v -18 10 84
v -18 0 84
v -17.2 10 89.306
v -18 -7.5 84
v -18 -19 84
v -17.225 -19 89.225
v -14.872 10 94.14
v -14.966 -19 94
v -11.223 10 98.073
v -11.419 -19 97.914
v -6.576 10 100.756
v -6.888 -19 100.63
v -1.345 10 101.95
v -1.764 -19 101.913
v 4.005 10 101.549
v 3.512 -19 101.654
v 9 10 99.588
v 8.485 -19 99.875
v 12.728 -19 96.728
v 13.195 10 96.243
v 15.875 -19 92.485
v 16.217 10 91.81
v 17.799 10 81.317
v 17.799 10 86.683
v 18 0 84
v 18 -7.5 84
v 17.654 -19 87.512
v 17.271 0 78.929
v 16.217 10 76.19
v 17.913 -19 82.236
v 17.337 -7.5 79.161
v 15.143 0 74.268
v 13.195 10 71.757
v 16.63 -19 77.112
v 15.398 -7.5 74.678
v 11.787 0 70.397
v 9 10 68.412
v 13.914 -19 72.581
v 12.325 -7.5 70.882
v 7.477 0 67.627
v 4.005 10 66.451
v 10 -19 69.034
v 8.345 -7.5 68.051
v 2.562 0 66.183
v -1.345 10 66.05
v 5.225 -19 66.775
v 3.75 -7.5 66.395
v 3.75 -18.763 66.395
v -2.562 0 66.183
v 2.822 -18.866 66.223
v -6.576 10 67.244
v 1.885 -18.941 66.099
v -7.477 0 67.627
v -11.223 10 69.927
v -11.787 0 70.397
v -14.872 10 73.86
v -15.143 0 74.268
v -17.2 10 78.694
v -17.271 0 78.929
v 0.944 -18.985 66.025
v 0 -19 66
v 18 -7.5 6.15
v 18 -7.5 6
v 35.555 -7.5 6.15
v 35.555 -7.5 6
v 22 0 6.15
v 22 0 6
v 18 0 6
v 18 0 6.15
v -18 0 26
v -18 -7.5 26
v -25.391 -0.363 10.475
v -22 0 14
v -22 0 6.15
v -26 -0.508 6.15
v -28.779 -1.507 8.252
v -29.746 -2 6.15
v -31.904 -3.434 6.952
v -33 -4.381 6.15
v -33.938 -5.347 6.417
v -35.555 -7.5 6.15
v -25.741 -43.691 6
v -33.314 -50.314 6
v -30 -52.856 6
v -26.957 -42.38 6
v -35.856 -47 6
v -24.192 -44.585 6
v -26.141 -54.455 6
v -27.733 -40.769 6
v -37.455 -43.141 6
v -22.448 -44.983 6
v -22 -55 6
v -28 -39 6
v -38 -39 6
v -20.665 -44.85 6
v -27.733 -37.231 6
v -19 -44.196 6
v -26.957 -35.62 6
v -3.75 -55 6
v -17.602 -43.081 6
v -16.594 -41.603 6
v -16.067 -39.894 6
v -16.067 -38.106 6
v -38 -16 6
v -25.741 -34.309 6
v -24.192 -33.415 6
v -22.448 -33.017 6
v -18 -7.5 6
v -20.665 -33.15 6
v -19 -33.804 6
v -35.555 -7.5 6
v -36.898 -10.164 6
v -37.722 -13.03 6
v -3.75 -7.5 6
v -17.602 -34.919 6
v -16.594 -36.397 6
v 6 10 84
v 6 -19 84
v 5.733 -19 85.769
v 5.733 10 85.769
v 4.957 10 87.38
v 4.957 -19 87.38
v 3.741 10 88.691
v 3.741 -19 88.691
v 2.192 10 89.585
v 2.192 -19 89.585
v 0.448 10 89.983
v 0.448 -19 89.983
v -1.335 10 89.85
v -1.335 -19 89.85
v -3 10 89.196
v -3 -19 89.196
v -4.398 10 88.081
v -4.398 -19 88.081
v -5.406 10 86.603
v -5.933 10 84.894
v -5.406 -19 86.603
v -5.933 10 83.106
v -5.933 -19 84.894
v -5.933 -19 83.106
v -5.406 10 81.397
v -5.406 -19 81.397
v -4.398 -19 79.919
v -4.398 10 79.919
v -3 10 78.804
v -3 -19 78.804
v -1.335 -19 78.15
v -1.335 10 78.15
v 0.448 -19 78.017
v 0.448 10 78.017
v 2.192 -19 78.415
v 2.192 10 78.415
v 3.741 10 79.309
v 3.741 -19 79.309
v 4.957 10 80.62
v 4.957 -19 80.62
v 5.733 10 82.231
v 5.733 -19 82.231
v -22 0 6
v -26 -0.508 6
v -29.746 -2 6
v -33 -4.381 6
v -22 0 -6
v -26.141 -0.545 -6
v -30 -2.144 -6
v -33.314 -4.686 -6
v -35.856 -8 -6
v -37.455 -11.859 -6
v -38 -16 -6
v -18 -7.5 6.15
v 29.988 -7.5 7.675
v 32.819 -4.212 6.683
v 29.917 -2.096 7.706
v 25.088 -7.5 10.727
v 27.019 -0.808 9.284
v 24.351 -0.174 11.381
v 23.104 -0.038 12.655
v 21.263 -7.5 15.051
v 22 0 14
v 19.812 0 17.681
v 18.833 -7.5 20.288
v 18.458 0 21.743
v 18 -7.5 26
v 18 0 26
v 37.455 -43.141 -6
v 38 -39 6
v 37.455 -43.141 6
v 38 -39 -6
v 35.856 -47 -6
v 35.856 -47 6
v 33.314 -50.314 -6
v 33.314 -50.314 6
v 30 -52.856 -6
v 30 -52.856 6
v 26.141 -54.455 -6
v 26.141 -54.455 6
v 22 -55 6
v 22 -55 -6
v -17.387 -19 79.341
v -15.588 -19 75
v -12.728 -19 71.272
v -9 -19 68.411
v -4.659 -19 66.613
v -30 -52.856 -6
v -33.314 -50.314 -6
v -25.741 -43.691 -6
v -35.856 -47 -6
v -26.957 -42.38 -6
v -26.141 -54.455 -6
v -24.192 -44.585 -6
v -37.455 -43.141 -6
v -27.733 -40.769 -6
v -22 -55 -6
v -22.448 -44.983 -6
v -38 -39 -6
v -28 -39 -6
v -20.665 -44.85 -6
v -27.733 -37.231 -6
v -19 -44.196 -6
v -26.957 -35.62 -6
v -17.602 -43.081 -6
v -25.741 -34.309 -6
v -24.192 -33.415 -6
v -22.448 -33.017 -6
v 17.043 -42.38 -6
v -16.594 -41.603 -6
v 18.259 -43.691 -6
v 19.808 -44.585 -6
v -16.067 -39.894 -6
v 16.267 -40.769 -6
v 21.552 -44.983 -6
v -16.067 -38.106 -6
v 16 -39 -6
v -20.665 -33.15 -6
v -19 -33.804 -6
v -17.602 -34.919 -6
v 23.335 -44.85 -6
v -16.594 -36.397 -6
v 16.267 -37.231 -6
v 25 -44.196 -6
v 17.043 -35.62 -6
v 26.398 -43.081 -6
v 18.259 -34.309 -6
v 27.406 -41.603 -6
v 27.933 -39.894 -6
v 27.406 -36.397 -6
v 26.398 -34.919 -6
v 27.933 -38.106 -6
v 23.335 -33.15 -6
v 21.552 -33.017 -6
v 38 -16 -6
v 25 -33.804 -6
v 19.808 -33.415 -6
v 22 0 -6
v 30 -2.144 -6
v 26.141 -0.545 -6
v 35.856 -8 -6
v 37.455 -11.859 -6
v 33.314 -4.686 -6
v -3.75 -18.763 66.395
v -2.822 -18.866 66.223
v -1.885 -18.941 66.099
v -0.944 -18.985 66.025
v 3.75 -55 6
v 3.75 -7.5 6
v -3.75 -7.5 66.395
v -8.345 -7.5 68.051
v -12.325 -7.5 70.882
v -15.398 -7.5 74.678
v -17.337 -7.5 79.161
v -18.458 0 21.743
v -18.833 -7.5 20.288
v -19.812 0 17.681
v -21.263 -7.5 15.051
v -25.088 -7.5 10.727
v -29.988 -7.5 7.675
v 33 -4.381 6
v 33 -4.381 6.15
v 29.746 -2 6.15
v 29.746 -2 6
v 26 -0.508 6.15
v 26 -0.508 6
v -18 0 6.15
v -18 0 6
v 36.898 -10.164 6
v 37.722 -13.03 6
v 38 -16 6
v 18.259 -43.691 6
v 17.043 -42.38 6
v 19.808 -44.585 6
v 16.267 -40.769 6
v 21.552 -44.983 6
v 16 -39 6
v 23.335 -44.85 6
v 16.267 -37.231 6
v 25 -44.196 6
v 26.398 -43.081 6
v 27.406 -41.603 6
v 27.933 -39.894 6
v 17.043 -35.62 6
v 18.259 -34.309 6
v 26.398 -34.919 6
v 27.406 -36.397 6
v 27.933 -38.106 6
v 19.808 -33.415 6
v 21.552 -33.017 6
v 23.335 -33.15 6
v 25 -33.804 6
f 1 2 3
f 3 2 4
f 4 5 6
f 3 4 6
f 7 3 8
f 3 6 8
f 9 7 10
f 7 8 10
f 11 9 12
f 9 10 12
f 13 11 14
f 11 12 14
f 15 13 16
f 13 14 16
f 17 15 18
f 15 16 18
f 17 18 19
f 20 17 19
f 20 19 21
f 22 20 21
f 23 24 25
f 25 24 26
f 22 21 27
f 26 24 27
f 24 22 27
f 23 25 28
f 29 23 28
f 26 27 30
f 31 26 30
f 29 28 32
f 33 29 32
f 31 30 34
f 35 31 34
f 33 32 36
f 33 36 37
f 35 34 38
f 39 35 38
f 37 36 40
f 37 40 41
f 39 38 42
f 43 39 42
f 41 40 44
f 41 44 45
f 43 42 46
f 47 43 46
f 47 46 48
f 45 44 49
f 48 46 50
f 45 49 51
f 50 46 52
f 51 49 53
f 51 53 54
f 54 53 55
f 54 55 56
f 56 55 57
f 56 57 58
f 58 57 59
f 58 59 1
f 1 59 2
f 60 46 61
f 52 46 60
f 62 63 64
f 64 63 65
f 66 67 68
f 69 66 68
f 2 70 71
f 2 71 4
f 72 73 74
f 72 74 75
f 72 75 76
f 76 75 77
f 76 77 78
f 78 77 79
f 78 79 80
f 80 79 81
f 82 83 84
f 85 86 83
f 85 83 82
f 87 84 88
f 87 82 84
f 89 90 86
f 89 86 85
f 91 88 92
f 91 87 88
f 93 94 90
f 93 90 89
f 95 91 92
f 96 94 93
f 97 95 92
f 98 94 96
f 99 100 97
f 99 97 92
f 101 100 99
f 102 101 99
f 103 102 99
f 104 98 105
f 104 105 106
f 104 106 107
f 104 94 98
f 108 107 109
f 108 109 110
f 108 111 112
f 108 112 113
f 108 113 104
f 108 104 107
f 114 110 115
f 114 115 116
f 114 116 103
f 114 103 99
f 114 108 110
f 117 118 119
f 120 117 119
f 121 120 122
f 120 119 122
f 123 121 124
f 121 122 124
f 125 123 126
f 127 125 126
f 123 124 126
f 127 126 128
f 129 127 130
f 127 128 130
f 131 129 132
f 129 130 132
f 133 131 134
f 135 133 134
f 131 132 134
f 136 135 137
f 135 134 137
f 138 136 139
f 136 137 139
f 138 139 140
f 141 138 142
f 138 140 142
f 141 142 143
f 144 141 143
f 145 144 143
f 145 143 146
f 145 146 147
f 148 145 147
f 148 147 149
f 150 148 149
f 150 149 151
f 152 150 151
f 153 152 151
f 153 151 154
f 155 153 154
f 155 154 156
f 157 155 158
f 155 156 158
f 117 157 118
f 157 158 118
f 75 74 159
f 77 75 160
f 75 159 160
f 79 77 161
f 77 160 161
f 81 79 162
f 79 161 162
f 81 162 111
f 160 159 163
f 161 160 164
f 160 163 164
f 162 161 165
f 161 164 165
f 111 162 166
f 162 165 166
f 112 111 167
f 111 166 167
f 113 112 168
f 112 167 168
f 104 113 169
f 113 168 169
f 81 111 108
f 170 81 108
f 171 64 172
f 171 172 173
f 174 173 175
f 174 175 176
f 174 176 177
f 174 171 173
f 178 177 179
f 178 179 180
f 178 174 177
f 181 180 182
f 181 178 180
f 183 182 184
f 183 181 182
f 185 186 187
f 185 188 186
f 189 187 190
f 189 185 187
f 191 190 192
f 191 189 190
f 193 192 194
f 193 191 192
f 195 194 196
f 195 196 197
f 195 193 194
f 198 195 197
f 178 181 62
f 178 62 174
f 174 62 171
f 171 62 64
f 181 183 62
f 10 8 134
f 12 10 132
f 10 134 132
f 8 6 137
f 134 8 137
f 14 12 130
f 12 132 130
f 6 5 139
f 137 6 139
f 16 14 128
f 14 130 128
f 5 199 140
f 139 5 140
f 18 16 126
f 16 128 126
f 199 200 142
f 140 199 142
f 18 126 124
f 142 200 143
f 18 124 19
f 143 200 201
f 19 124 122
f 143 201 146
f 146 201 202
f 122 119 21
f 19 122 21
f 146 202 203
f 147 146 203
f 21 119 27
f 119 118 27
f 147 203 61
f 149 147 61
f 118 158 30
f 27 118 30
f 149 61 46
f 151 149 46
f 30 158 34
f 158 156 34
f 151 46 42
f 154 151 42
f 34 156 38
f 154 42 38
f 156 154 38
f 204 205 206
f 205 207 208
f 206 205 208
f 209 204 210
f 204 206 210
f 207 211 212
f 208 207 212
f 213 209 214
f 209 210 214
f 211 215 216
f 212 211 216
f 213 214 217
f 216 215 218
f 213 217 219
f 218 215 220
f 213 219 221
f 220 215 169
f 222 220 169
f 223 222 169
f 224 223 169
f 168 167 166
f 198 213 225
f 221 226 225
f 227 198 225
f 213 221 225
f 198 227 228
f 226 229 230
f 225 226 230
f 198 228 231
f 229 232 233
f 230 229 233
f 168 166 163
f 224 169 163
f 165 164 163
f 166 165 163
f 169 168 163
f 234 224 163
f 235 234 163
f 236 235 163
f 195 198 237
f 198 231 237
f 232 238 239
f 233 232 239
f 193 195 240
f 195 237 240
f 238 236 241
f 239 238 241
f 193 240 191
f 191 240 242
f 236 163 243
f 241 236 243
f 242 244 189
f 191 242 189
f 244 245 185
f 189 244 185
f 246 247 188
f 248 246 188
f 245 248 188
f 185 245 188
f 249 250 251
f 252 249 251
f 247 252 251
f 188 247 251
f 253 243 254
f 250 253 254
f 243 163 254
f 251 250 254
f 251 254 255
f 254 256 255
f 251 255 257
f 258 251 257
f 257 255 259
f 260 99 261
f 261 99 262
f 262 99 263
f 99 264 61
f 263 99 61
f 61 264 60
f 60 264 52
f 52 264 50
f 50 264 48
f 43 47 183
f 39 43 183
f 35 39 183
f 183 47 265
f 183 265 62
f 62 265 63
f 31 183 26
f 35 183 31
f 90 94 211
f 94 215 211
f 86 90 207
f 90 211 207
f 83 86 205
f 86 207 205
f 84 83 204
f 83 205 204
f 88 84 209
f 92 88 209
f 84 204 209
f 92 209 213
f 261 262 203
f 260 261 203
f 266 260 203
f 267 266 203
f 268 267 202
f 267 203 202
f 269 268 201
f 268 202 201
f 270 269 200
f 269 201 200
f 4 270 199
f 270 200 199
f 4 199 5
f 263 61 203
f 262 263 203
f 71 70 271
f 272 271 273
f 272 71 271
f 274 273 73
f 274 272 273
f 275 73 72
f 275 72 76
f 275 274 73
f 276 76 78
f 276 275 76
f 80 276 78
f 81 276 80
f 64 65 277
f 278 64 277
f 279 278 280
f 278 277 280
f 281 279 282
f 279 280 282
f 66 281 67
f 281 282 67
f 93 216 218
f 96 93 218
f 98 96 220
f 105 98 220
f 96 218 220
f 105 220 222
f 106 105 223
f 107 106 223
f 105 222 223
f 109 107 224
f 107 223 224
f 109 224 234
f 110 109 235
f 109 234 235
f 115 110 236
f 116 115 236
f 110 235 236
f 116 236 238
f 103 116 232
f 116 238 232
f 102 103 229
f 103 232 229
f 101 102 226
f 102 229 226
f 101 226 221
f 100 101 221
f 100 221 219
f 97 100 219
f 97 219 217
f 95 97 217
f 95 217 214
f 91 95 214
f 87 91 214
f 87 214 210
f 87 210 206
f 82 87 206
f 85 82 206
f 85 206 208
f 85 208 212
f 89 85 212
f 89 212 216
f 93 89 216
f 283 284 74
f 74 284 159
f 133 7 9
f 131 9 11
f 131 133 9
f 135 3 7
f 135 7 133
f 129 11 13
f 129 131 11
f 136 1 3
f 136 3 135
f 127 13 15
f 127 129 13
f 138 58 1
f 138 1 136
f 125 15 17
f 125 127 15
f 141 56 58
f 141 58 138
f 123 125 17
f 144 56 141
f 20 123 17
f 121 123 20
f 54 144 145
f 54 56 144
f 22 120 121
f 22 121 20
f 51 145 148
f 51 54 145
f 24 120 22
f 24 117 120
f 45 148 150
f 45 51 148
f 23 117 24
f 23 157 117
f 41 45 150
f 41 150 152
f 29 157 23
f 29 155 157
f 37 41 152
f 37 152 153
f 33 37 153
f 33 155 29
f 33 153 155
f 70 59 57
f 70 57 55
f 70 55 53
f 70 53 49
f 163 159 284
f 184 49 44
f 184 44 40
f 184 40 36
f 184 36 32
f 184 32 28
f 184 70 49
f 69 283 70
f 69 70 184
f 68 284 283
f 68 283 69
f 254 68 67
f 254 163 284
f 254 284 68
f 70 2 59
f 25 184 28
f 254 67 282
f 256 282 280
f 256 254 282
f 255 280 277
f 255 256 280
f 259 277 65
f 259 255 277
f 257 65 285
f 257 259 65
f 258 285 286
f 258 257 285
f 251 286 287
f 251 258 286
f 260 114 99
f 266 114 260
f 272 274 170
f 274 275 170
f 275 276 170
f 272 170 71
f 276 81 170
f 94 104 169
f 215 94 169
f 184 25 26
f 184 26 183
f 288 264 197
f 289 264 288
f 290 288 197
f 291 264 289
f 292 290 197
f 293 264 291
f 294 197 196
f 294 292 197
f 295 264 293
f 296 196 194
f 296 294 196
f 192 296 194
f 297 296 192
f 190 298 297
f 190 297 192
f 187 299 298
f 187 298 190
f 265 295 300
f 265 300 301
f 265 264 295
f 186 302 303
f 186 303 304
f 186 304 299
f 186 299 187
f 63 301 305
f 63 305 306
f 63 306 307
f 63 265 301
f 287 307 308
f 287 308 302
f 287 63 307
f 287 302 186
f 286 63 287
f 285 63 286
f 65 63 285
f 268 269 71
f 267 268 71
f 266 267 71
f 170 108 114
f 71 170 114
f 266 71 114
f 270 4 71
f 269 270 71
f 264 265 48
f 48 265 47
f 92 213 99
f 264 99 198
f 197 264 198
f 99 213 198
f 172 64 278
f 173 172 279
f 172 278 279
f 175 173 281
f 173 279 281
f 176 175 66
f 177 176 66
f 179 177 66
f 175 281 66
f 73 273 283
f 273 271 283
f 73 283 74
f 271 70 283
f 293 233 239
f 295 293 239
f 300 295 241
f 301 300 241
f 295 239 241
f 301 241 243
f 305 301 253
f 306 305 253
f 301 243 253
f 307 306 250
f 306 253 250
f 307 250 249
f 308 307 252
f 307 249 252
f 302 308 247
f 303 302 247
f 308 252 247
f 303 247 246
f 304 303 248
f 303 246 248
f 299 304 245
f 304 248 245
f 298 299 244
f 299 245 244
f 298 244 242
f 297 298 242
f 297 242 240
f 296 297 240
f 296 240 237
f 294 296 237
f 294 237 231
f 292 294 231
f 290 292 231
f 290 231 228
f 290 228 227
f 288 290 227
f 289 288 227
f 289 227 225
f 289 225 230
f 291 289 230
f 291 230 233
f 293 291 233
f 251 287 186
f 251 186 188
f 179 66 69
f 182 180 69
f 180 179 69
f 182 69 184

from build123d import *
from build123d.topology import SkipClean

# Parameters (mm, degrees)
SKETCH2_W                = 76
SKETCH2_H                = 12
BOSS_EXTRUDE1_DEPTH      = 55
BOSS_EXTRUDE2_DEPTH      = 7.5
BOSS_EXTRUDE3_DEPTH      = 10
BOSS_EXTRUDE3_DEPTH_BACK = 19
FILLET1_R                = 16
F_12_0MM_DOWEL_HOLE1_D   = 12
RIB1_START               = -3.75
RIB1_DEPTH               = 7.5
FILLET2_START            = 6
FILLET2_DEPTH            = 0.149958722
FILLET2_START_2          = 6.149958722
FILLET2_2_DEPTH          = 19.850041378
FILLET2_START_3          = -7.500000001
FILLET2_3_DEPTH          = 8.500000001


with BuildPart() as part:
    # Sketch2 → Boss-Extrude1 (new body)
    with BuildSketch(Plane(origin=(0, 0, 0), x_dir=(1, 0, 0), z_dir=(0, 1, 0))):
        Rectangle(SKETCH2_W, SKETCH2_H)
    extrude(amount=-BOSS_EXTRUDE1_DEPTH)

    # Sketch2<3> → Boss-Extrude2 (add)
    with BuildSketch(Plane(origin=(0, 0, 0), x_dir=(1, 0, 0), z_dir=(0, 1, 0))):
        with BuildLine():
            Line((18, -6), (-18, -6))
            Line((-18, -6), (-18, -84))
            ThreePointArc((-18, -84), (0, -66), (18, -84))
            Line((18, -84), (18, -6))
        make_face()
    extrude(amount=-BOSS_EXTRUDE2_DEPTH)

    # Sketch2<4> → Boss-Extrude3 (add, two sides: drawn at the far end of the back side and taken through both)
    with BuildSketch(Plane(origin=(0, 0, 0), x_dir=(1, 0, 0), z_dir=(0, 1, 0)).offset(-BOSS_EXTRUDE3_DEPTH_BACK)):
        with BuildLine():
            ThreePointArc((18, -84), (0, -66), (-18, -84))
            Line((-18, -84), (-6, -84))
            ThreePointArc((-6, -84), (0, -78), (6, -84))
            Line((6, -84), (18, -84))
        make_face()
        with BuildLine():
            Line((-6, -84), (-18, -84))
            ThreePointArc((-18, -84), (0, -102), (18, -84))
            Line((18, -84), (6, -84))
            ThreePointArc((6, -84), (0, -90), (-6, -84))
        make_face()
    extrude(amount=BOSS_EXTRUDE3_DEPTH + BOSS_EXTRUDE3_DEPTH_BACK)

    # Fillet1
    fillet1_edges = [part.edges().sort_by_distance(p)[0] for p in [
        (38, -55, 0),
        (-38, -55, 0),
        (-38, 0, 0),
        (38, 0, 0),
    ]]
    fillet(fillet1_edges, radius=FILLET1_R)

    # Ø12.0mm Dowel Hole1 (through all)
    with Locations(Plane.XY.offset(6)):
        with Locations((-22, -39), (22, -39)):
            Hole(F_12_0MM_DOWEL_HOLE1_D / 2)

    # Rib1: read off the stored shape, not the designer's step
    # Rib1 outline → Rib1 (add)
    with SkipClean():  # the faces are left unmerged after this step: merging them gives an invalid solid
        with BuildSketch(Plane.ZY.offset(RIB1_START)):
            Polygon((6, -55), (66.394958109, -18.763025135), (68, -17.8), (68, -7.5), (6, -7.5), align=None)
        extrude(amount=RIB1_DEPTH)

    # Fillet2: read off the stored shape, not the designer's step
    # Fillet2 outline → Fillet2 (add)
    with SkipClean():  # the faces are left unmerged after this step: merging them gives an invalid solid
        with BuildSketch(Plane.XY.offset(FILLET2_START)):
            with BuildLine():
                Line((-18, -7.5), (-18, 0))
                Line((-18, 0), (-22, 0))
                ThreePointArc((-22, 0), (-29.745966692, -2), (-35.555441712, -7.5))
                Line((-35.555441712, -7.5), (-18, -7.5))
            make_face()
            with BuildLine():
                Line((18, -7.5), (35.555441712, -7.5))
                ThreePointArc((35.555441712, -7.5), (29.745966692, -2), (22, 0))
                Line((22, 0), (18, 0))
                Line((18, 0), (18, -7.5))
            make_face()
        extrude(amount=FILLET2_DEPTH)

    # Fillet2 2 outline → Fillet2 2 (add)
    with SkipClean():  # the faces are left unmerged after this step: merging them gives an invalid solid
        with BuildSketch(Plane.XY.offset(FILLET2_START_2)):
            with BuildLine():
                Line((-18, -7.5), (-18, 0))
                Line((-18, 0), (-22, 0))
                ThreePointArc((-22, 0), (-29.745966693, -2), (-35.555441712, -7.500000001))
                Line((-35.555441712, -7.500000001), (-18, -7.5))
            make_face()
            with BuildLine():
                Line((18, -7.5), (35.555441712, -7.5))
                ThreePointArc((35.555441712, -7.5), (29.745966692, -2), (22, 0))
                Line((22, 0), (18, 0))
                Line((18, 0), (18, -7.5))
            make_face()
        extrude(amount=FILLET2_2_DEPTH)

    # Fillet2 3 outline → Fillet2 3 (cut)
    with SkipClean():  # the faces are left unmerged after this step: merging them gives an invalid solid
        with BuildSketch(Plane(origin=(0, 0, 0), x_dir=(1, 0, 0), z_dir=(0, 1, 0)).offset(FILLET2_START_3)):
            with BuildLine():
                Line((37, -5.972059597), (35.555441712, -6.149958822))
                ThreePointArc((35.555441712, -6.149958822), (23.018491969, -12.750305018), (18, -26))
                Line((18, -26), (37, -26.0000001))
                Line((37, -26.0000001), (37, -5.972059597))
            make_face()
            with BuildLine():
                Line((-35.555441712, -6.149958822), (-37, -5.972059597))
                Line((-37, -5.972059597), (-37, -26.0000001))
                Line((-37, -26.0000001), (-18, -26))
                ThreePointArc((-18, -26), (-23.018491969, -12.750305018), (-35.555441712, -6.149958822))
            make_face()
        extrude(amount=FILLET2_3_DEPTH, mode=Mode.SUBTRACT)


solid = part.part
